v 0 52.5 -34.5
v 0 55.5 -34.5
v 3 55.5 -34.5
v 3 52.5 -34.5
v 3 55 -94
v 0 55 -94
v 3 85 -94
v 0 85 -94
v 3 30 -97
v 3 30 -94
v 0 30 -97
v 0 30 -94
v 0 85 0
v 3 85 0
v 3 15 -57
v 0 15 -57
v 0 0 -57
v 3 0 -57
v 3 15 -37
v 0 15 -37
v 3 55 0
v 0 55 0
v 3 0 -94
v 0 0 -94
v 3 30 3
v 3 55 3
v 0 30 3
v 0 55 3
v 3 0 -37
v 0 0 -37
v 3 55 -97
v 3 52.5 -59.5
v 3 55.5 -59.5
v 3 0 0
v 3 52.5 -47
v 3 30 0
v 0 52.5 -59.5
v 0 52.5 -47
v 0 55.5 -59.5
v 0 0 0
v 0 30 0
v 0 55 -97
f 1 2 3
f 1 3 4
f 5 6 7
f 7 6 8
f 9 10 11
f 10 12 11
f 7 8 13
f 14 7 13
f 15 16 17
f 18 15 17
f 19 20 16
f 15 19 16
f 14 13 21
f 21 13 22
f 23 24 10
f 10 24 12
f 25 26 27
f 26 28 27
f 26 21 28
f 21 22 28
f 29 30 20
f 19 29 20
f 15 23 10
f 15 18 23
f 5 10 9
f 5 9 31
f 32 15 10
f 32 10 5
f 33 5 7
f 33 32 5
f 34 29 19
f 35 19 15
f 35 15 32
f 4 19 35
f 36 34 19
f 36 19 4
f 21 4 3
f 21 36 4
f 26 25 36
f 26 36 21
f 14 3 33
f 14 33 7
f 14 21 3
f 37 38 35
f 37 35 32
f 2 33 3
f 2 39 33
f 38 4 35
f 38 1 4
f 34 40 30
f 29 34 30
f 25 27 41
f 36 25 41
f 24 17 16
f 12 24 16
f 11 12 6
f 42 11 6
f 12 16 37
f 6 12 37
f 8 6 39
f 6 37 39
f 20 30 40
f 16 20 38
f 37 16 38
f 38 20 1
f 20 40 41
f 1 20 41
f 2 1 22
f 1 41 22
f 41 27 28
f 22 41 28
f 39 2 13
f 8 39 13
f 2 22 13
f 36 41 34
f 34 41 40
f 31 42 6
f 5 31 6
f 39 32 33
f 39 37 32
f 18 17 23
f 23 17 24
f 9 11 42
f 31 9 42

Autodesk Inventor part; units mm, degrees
ref_plane "YZ Plane" through (0, 0, 0) normal (1, 0, 0) x (0, 1, 0)
ref_plane "XZ Plane" through (0, 0, 0) normal (0, 1, 0) x (-1, 0, 0)
ref_plane "XY Plane" through (0, 0, 0) normal (0, 0, 1) x (1, 0, 0)
sketch "Sketch1" plane through (0, 0, 0) normal (1, 0, 0) x (0, 1, 0)
  line L0 (0, -94) -> (30, -94)
  line L1 (30, -94) -> (30, -97)
  line L2 (30, -97) -> (55, -97)
  line L3 (55, -97) -> (55, -94)
  line L4 (55, -94) -> (85, -94)
  line L5 (85, -94) -> (85, 0)
  line L6 (85, 0) -> (55, 0)
  line L7 (55, 0) -> (55, 3)
  line L8 (55, 3) -> (30, 3)
  line L9 (30, 3) -> (30, 0)
  line L10 (30, 0) -> (0, 0)
  line L11 (0, 0) -> (0, -37)
  line L12 (0, -37) -> (15, -37)
  line L13 (15, -37) -> (15, -57)
  line L14 (15, -57) -> (0, -57)
  line L15 (0, -57) -> (0, -94)
  line L16 (0, -47) -> (52.5, -47) construction
  line L17 (52.5, -47) -> (80, -47) construction
  line L18 (0, -47) -> (52.5, -47) construction
  line L19 (52.5, -47) -> (55.5, -47) construction
  line L20 (52.5, -47) -> (52.5, -59.5)
  line L21 (52.5, -59.5) -> (55.5, -59.5)
  line L22 (55.5, -59.5) -> (55.5, -34.5)
  line L23 (55.5, -34.5) -> (52.5, -34.5)
  line L24 (52.5, -34.5) -> (52.5, -47)
  point P0 (42.5, 3)
  dimension "d0" = 94
  dimension "d1" = 30
  dimension "d2" = 3
  dimension "d3" = 25
  dimension "d5" = 30
  dimension "d6" = 94
  dimension "d7" = 30
  dimension "d8" = 3
  dimension "d9" = 25
  dimension "d10" = 3
  dimension "d11" = 30
  dimension "d15" = 15
  dimension "d16" = 20
  dimension "d23" = 27.5
  dimension "d26" = 3
  dimension "d27" = 12.5
  dimension "d28" = 3
  dimension "d29" = 25
  dimension "d30" = 3
  dimension "d31" = 12.5
  dimension "d34" = 52.5
  dimension "d35" = 37
  dimension "d36" = 50
extrude "Extrusion2" add sketch "Sketch1" along normal blind 3
properties part number "Depan"
